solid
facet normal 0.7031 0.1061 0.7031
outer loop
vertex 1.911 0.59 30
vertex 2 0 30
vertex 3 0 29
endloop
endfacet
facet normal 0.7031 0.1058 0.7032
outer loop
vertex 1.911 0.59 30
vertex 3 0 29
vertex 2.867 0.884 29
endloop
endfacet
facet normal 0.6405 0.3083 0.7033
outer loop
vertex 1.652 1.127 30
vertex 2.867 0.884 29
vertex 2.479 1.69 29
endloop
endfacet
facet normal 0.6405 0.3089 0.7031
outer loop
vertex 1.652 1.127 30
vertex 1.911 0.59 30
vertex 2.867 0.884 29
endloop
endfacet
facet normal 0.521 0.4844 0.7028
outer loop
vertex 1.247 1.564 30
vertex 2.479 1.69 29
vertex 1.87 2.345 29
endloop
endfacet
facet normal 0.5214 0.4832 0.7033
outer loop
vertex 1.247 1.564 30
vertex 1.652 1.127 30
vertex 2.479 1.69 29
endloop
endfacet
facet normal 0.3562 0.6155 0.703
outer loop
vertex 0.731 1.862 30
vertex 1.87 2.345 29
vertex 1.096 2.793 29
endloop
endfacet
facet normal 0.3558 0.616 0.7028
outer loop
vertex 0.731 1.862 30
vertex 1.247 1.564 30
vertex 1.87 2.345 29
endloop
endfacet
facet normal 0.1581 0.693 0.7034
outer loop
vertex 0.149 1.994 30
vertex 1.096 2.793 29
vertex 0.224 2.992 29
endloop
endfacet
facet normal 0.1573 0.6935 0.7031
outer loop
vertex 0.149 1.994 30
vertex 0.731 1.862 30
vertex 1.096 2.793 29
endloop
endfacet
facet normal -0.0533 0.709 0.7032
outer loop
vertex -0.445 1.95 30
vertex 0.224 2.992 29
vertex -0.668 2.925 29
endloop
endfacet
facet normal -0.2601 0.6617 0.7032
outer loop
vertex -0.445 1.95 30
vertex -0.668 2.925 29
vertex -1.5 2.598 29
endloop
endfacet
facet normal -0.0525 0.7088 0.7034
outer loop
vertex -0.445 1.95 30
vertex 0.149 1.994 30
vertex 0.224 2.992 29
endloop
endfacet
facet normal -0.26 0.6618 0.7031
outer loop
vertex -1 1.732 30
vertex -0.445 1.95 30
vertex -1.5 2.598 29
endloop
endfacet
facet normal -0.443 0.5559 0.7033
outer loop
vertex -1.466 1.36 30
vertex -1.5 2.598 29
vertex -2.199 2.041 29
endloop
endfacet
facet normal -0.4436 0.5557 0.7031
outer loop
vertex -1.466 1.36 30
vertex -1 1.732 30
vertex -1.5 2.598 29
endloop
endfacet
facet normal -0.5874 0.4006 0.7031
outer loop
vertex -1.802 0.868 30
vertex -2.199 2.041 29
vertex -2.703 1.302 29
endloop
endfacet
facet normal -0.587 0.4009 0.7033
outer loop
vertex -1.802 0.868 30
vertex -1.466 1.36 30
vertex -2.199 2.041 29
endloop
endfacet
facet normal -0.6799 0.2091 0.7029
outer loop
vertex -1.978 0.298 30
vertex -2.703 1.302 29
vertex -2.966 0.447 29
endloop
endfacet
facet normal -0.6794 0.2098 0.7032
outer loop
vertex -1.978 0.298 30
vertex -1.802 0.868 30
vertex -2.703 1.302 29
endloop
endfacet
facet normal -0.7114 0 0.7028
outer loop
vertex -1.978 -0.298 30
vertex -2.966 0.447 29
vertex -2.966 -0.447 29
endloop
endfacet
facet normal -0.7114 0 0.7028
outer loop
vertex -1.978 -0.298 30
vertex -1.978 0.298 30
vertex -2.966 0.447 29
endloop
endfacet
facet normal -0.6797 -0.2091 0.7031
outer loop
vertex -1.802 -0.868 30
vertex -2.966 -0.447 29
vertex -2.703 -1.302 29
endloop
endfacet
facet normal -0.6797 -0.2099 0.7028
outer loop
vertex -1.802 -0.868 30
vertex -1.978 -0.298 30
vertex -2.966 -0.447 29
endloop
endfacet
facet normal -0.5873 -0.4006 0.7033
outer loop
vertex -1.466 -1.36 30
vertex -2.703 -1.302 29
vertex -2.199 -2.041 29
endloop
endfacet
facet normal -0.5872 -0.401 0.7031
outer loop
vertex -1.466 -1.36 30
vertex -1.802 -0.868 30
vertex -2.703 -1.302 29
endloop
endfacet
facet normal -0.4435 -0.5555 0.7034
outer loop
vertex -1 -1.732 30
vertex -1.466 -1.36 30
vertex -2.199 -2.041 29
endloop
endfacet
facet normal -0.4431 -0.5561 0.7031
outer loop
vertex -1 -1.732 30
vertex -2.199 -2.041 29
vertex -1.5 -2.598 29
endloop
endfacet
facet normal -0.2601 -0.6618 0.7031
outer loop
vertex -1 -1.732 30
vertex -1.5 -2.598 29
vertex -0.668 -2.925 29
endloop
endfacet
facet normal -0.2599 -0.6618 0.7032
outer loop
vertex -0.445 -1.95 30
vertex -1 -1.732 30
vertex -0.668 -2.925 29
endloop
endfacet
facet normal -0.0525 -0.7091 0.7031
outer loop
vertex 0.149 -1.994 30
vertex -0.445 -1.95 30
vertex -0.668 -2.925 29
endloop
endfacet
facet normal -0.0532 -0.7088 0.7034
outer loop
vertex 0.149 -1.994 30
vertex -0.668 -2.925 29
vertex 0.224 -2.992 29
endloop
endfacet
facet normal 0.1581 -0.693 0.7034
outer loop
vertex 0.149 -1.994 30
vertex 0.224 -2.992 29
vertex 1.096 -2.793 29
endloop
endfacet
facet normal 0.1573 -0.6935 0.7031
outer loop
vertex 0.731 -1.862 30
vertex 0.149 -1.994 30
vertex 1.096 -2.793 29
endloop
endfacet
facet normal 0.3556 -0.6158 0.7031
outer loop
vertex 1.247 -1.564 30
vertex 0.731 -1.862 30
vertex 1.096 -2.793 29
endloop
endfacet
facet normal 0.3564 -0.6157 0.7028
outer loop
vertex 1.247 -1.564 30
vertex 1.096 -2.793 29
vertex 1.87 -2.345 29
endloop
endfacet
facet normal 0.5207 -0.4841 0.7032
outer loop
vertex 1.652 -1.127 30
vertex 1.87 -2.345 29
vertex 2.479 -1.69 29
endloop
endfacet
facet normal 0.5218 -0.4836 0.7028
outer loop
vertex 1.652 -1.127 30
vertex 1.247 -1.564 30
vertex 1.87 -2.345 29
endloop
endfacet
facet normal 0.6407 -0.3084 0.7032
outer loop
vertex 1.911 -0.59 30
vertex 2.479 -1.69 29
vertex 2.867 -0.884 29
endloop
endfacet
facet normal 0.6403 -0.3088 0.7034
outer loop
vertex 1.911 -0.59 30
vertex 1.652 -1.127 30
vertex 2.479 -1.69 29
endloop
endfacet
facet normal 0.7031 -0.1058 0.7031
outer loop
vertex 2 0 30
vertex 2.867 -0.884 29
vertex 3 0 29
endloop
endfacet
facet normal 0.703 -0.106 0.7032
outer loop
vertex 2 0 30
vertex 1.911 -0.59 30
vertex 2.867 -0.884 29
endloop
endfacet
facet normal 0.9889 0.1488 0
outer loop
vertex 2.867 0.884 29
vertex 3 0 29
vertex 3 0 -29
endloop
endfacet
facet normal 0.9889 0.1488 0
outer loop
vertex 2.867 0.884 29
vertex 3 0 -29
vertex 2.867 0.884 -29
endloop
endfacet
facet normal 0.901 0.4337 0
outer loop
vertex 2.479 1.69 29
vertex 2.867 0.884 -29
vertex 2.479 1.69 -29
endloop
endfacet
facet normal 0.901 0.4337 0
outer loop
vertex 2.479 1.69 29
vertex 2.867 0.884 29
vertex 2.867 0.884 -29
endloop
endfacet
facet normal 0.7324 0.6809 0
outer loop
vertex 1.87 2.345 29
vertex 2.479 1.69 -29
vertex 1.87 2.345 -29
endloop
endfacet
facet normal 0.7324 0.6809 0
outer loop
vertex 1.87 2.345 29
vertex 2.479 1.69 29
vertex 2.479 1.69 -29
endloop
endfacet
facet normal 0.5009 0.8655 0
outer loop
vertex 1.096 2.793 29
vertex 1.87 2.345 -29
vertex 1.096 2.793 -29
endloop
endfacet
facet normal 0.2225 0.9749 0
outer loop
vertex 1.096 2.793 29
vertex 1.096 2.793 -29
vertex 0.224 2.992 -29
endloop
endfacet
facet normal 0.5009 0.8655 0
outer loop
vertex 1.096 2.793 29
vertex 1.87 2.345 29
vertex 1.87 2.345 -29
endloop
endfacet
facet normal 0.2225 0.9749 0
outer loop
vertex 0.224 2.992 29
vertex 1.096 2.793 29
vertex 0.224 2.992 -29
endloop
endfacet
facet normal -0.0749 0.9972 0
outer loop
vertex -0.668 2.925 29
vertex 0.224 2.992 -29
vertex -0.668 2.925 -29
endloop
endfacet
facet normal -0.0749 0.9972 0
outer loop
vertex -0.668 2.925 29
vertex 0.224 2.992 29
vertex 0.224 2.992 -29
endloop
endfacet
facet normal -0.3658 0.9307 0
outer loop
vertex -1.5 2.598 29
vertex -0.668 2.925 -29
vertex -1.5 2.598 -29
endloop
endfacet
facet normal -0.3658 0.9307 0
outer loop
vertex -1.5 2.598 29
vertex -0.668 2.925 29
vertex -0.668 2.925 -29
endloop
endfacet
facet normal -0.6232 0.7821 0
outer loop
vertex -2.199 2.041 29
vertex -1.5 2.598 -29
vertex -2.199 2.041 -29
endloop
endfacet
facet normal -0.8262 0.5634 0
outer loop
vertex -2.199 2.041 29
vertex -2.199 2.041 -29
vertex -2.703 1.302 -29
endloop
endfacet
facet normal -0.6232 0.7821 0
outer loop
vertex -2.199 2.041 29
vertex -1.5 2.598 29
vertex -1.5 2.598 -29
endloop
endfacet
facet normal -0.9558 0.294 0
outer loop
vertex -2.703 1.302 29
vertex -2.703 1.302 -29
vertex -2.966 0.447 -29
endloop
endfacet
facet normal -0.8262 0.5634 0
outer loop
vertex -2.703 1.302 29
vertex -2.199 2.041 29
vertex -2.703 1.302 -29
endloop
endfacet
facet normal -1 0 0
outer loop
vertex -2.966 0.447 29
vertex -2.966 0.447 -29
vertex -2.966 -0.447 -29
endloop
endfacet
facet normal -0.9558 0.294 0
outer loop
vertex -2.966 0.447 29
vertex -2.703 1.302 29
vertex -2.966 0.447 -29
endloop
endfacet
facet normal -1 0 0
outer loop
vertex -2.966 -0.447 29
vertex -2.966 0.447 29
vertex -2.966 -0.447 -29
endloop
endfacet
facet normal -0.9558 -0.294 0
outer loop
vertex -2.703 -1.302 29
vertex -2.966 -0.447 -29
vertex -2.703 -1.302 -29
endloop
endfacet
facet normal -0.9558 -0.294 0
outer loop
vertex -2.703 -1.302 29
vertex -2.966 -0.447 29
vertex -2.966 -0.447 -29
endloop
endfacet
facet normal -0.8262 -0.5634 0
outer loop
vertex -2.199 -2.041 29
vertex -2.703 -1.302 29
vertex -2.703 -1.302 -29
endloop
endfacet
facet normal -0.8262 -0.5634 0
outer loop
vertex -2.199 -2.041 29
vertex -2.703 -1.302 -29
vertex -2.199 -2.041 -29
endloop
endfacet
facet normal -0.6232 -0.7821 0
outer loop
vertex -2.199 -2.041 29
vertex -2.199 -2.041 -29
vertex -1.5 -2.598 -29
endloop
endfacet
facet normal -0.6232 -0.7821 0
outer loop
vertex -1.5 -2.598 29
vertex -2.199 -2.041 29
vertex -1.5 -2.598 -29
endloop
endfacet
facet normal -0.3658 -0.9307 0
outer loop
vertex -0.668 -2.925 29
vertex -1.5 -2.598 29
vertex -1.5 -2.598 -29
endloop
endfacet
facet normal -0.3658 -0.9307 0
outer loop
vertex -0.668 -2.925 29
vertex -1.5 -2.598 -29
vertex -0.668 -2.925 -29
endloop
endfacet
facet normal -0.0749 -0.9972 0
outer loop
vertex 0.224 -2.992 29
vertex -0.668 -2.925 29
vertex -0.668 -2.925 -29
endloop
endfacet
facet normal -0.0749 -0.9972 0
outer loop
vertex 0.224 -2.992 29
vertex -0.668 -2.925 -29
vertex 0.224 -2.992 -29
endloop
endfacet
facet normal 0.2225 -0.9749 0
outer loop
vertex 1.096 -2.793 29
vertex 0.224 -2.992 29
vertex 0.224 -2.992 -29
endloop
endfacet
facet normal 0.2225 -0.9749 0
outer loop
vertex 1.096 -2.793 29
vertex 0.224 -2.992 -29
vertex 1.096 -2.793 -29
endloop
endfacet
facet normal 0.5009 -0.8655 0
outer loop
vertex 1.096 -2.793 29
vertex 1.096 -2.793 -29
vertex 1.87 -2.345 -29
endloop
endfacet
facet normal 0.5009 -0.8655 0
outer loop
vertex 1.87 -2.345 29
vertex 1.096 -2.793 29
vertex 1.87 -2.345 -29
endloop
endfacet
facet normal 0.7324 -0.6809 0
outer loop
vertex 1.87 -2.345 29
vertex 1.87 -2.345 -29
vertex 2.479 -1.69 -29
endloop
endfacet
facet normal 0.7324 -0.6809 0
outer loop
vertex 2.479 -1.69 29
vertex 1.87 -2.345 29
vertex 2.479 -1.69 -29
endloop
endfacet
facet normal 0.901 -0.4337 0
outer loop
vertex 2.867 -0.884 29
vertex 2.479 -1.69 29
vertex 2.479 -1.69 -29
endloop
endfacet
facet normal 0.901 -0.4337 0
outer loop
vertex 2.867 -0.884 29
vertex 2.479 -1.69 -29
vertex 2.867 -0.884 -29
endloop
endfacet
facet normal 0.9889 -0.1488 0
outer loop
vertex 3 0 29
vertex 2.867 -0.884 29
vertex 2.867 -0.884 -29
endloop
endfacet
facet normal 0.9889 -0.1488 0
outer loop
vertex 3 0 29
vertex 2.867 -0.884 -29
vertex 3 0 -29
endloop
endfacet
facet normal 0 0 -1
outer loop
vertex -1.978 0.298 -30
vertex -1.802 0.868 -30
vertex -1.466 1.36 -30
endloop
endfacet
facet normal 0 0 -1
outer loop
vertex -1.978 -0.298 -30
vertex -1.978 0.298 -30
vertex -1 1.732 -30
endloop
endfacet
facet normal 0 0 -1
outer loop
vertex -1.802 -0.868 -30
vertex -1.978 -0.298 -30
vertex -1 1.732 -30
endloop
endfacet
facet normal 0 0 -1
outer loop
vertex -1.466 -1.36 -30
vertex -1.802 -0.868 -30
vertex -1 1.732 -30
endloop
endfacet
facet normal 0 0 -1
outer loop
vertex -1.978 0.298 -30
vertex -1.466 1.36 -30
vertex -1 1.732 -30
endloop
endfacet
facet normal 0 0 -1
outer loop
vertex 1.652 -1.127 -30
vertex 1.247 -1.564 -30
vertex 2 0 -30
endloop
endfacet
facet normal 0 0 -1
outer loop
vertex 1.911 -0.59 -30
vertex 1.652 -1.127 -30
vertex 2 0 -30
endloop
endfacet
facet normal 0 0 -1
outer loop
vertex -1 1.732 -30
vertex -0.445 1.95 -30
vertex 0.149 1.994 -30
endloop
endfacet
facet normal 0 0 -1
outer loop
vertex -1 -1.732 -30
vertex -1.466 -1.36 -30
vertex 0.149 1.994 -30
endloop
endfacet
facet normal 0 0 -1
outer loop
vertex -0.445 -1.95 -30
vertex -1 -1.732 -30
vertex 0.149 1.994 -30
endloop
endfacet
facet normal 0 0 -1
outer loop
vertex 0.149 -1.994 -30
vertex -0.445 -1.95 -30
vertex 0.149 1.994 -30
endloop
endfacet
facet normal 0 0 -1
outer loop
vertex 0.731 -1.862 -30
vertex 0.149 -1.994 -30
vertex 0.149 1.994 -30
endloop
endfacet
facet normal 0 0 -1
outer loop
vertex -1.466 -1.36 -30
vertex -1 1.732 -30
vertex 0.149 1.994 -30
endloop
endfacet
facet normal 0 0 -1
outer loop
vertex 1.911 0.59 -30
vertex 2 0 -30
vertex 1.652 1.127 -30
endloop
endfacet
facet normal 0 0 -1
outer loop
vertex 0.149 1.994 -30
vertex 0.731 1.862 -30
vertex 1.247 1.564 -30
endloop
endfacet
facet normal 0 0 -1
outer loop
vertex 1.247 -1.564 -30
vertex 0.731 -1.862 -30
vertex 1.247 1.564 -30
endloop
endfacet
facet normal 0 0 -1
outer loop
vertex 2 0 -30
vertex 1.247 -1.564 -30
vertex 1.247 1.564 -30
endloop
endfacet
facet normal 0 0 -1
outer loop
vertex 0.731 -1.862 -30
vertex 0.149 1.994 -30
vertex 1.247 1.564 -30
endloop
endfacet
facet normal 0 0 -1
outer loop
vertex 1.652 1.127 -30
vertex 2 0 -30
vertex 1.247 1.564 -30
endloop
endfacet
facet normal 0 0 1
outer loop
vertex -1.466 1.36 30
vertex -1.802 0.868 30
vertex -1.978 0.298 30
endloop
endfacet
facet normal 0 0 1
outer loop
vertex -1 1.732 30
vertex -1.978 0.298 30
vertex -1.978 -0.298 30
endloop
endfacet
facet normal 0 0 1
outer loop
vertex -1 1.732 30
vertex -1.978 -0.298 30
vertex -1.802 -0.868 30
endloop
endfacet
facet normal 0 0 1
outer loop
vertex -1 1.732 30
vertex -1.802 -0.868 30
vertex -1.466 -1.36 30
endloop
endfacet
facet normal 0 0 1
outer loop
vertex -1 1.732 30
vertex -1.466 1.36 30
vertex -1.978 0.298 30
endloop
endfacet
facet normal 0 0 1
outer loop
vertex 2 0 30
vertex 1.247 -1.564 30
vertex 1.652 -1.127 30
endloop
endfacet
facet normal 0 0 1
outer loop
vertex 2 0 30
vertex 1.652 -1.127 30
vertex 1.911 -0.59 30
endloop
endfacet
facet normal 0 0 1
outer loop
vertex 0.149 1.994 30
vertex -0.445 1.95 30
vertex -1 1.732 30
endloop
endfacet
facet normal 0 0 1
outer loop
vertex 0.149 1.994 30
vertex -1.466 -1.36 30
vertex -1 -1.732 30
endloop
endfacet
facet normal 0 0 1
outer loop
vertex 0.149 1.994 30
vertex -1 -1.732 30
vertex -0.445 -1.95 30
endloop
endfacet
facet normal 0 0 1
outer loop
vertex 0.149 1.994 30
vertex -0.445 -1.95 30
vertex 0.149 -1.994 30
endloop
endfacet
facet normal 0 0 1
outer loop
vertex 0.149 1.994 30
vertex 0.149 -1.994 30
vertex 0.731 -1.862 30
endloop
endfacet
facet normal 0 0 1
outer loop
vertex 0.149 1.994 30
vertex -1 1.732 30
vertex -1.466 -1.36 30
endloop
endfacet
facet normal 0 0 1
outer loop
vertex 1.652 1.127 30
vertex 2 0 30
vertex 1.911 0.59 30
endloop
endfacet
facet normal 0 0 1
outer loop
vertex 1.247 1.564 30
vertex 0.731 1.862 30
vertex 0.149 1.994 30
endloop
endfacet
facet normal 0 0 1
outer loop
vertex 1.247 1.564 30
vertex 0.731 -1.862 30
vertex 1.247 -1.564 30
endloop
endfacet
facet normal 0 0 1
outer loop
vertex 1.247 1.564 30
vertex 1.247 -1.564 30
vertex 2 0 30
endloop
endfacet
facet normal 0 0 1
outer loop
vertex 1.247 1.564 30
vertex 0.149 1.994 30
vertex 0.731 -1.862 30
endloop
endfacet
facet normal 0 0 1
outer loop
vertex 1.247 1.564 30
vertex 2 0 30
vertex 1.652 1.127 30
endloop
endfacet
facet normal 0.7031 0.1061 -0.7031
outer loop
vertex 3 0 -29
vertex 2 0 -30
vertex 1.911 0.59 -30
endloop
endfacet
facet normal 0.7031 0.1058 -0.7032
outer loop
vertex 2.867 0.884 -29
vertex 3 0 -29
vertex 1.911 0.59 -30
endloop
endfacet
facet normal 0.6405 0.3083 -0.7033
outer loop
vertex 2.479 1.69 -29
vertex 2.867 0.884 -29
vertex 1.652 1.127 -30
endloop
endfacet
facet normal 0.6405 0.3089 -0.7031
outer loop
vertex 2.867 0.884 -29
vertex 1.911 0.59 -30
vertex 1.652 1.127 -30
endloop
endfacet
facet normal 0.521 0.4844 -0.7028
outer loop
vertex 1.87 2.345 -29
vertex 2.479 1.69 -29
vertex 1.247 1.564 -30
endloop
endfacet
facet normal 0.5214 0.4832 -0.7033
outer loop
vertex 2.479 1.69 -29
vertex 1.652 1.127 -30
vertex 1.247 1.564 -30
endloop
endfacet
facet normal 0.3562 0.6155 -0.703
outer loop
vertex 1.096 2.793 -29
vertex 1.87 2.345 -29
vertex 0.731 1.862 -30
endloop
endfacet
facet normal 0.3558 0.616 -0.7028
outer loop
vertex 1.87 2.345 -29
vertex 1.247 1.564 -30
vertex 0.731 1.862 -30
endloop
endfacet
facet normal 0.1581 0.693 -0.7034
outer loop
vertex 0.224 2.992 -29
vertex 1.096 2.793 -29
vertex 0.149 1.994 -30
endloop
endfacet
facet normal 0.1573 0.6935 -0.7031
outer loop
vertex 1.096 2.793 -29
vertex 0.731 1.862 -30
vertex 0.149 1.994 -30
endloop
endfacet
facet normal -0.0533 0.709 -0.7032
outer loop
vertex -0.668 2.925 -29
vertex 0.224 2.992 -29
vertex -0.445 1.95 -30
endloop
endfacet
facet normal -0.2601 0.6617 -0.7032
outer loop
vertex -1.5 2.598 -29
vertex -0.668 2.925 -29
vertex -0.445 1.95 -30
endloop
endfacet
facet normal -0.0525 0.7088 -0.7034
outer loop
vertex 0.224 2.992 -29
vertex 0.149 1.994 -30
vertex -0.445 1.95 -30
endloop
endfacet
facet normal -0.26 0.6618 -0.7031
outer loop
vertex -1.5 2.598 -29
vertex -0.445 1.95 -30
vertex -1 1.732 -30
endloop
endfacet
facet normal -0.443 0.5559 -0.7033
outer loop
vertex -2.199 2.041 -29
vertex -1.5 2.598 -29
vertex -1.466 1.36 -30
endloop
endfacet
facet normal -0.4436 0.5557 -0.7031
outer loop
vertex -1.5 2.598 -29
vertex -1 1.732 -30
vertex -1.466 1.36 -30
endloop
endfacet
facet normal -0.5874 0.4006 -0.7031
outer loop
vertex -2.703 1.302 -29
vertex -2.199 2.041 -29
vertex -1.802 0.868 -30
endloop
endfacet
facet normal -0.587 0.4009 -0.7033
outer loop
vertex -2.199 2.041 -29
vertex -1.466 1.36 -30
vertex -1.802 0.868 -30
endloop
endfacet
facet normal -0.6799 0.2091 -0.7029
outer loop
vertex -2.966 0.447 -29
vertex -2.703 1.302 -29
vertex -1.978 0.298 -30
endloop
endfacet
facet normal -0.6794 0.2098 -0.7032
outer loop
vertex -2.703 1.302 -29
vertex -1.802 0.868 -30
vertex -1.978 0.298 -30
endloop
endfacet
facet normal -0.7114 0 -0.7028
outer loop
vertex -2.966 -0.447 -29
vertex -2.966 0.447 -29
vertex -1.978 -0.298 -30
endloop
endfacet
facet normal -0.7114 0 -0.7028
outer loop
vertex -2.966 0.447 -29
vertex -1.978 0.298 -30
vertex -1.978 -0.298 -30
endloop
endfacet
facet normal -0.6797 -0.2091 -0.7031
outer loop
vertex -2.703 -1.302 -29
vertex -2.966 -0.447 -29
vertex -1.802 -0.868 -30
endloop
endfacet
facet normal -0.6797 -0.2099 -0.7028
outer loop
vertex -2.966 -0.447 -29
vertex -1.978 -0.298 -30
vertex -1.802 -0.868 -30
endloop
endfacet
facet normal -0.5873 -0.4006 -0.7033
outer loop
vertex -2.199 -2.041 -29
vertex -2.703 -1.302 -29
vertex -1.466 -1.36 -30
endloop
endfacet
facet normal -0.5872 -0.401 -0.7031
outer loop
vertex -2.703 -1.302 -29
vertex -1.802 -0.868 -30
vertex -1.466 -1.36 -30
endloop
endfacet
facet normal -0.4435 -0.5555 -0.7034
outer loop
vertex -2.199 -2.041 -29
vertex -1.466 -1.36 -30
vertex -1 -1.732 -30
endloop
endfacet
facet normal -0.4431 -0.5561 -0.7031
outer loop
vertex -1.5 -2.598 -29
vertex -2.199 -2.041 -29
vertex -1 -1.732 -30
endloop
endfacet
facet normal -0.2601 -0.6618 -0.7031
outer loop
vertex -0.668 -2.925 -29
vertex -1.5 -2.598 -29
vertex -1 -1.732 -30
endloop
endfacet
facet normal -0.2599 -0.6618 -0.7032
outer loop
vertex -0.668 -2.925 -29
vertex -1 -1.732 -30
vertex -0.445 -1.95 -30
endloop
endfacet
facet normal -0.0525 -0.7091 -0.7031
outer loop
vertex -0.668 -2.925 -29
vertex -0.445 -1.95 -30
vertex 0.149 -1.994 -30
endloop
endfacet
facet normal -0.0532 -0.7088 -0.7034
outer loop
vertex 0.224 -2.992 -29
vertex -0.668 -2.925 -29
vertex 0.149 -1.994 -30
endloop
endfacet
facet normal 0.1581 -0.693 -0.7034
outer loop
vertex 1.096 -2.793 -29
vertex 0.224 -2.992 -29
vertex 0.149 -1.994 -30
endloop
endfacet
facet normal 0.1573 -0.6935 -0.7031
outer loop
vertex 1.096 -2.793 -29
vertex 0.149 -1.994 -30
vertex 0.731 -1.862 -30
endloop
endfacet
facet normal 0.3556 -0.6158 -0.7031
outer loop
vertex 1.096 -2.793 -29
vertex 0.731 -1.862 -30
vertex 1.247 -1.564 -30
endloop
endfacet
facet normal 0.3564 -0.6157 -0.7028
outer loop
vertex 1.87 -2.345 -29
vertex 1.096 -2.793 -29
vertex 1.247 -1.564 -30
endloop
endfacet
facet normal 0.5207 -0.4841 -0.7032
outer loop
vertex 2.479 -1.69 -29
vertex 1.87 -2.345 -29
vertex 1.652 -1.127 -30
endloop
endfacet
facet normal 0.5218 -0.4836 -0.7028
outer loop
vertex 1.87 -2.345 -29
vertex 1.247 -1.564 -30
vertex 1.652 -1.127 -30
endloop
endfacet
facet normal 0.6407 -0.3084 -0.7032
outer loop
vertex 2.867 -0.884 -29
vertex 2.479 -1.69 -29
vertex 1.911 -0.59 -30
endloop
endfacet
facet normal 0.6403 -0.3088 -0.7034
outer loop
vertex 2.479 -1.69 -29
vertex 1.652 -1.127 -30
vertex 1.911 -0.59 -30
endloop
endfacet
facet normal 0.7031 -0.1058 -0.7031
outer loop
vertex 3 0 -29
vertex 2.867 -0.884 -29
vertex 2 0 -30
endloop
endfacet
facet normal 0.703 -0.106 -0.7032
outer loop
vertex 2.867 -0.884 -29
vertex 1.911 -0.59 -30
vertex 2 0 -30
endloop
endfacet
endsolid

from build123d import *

# Parameters (mm, degrees)
SKETCH1_R           = 3
BOSS_EXTRUDE1_DEPTH = 30
CHAMFER1_SIZE       = 1
CHAMFER2_SIZE       = 1


with BuildPart() as part:
    # Sketch1 → Boss-Extrude1 (new body, symmetric)
    with BuildSketch(Plane.XY):
        Circle(SKETCH1_R)
    extrude(amount=BOSS_EXTRUDE1_DEPTH, both=True)

    # Chamfer1
    chamfer1_edges = [part.edges().sort_by_distance(p)[0] for p in [
        (-3, 0, 30),
    ]]
    chamfer(chamfer1_edges, length=CHAMFER1_SIZE)

    # Chamfer2
    chamfer2_edges = [part.edges().sort_by_distance(p)[0] for p in [
        (-3, 0, -30),
    ]]
    chamfer(chamfer2_edges, length=CHAMFER2_SIZE)


solid = part.part
